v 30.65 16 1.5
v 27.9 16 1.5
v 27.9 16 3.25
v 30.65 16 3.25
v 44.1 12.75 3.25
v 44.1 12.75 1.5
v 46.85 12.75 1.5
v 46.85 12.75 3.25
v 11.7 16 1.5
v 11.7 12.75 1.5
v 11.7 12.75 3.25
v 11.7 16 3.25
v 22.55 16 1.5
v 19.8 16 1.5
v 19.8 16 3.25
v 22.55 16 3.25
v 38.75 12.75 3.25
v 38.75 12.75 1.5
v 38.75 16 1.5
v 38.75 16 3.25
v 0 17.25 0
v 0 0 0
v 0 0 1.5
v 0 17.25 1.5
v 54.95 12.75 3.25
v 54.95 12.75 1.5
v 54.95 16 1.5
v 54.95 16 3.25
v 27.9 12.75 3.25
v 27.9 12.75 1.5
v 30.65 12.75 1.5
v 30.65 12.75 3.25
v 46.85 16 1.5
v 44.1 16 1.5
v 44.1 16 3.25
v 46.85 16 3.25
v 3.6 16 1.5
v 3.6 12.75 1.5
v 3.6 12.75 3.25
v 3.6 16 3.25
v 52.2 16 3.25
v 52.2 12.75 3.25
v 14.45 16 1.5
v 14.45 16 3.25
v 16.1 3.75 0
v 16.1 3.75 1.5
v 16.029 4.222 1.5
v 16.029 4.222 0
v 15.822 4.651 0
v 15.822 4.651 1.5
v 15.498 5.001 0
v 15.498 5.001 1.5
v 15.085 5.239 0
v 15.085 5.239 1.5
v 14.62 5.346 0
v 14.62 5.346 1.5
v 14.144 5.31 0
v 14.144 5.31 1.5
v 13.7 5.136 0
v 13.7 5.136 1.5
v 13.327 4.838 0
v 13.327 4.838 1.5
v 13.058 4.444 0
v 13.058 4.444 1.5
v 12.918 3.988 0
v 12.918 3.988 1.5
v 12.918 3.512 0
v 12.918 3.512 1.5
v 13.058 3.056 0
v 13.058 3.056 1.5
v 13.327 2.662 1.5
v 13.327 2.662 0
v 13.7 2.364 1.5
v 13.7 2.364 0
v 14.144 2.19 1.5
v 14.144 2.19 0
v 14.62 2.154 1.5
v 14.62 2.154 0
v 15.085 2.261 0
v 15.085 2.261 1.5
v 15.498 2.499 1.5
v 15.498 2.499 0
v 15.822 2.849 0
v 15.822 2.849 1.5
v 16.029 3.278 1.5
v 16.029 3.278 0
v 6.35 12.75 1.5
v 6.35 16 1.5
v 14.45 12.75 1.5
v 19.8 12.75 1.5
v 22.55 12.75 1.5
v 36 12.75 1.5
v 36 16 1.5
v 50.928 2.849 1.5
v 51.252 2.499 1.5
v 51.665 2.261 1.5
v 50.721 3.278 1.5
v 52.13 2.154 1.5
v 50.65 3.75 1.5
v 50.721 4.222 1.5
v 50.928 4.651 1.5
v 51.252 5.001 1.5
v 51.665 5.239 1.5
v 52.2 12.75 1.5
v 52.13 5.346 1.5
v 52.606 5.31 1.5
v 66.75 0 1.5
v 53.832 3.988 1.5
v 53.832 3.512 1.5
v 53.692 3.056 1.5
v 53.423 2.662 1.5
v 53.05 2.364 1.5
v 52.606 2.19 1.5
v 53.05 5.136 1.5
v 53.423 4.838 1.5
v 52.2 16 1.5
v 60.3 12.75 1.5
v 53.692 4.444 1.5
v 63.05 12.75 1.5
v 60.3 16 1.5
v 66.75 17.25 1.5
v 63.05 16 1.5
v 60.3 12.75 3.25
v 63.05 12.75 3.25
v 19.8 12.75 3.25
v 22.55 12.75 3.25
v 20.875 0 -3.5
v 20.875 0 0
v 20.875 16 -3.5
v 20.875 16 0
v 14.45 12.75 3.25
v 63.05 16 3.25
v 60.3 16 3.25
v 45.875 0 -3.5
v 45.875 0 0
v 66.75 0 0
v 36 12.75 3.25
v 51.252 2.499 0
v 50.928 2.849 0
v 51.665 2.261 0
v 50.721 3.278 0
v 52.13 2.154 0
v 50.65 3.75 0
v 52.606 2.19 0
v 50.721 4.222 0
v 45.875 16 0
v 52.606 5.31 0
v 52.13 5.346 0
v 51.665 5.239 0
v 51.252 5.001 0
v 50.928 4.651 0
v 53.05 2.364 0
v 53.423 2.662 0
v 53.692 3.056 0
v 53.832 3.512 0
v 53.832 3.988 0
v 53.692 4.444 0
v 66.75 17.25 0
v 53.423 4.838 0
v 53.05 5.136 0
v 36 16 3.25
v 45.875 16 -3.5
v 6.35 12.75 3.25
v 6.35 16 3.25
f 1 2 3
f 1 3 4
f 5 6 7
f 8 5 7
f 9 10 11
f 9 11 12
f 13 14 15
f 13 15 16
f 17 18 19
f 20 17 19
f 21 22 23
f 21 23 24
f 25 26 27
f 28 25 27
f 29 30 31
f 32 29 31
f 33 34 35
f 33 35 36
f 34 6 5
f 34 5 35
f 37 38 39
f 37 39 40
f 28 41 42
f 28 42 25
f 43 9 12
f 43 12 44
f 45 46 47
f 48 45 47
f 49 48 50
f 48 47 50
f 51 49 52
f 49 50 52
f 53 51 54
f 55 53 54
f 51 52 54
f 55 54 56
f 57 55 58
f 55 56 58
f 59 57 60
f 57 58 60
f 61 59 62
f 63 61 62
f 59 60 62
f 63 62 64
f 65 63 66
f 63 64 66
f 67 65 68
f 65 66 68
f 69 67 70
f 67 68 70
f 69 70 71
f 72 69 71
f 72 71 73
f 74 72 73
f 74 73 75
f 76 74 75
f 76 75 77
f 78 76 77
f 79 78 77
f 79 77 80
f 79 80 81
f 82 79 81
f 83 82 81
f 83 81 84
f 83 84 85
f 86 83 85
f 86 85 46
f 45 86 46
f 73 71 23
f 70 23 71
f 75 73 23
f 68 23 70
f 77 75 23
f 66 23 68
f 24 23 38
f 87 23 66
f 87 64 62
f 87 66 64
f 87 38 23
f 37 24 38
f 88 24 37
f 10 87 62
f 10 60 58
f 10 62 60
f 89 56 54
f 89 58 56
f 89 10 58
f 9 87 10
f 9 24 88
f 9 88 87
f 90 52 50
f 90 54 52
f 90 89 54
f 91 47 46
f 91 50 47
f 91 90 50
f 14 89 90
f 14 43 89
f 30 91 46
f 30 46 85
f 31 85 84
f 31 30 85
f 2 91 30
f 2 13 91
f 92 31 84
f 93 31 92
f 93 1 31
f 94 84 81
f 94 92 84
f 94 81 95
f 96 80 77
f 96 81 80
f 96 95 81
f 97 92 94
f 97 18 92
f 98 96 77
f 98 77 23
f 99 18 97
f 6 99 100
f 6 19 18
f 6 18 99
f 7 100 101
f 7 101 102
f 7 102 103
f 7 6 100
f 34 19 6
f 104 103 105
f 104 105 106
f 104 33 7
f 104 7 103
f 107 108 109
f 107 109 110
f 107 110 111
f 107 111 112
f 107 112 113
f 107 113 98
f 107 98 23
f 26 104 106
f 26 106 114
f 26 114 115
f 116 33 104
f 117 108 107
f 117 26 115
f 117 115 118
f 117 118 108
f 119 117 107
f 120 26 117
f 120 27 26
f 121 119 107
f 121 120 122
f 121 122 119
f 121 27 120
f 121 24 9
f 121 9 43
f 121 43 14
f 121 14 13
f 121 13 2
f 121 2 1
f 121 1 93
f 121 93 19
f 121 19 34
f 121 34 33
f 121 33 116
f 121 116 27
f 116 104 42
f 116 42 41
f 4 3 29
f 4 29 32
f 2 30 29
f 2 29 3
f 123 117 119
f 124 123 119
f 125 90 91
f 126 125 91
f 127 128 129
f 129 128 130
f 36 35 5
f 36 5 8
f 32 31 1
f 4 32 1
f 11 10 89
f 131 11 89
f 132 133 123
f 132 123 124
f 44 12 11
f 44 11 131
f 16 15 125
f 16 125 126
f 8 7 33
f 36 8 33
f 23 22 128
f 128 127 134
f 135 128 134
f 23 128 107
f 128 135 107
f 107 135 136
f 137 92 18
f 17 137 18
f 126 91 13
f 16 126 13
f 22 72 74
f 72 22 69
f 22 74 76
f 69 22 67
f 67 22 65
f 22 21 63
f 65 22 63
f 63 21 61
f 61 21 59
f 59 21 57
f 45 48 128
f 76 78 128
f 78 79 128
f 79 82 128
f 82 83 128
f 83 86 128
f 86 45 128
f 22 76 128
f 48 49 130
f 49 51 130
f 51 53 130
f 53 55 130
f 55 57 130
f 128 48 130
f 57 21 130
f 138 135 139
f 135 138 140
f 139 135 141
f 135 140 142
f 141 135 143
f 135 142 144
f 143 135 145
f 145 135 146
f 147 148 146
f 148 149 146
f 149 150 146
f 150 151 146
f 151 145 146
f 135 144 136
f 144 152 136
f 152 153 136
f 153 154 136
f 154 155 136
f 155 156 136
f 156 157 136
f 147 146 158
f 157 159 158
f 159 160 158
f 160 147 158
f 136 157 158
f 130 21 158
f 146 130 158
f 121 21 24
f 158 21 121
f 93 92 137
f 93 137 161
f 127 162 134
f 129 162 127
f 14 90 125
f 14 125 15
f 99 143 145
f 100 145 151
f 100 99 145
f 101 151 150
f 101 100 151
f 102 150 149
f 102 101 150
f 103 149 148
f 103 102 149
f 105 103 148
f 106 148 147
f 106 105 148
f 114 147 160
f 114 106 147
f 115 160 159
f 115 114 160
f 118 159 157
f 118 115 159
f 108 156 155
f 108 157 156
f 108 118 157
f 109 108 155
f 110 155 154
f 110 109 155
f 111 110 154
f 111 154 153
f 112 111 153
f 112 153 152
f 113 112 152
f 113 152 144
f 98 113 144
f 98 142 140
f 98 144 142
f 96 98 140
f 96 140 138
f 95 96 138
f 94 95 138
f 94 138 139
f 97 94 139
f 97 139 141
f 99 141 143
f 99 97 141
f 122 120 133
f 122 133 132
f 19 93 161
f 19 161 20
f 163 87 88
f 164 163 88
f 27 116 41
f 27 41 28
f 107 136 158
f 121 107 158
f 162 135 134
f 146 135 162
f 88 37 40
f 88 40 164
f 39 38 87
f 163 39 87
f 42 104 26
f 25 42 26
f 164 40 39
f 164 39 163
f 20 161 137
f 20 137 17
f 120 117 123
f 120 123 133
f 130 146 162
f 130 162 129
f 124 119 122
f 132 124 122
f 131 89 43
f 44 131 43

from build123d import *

# Parameters (mm, degrees)
SKETCH1_W           = 66.75
SKETCH1_H           = 17.25
BOSS_EXTRUDE1_DEPTH = 1.5
SKETCH2_W           = 2.75
SKETCH2_H           = 3.25
BOSS_EXTRUDE2_DEPTH = 1.75
LPATTERN1_COUNT     = 8
LPATTERN1_PITCH     = 8.1
SKETCH3_R           = 1.6
CUT_EXTRUDE1_DEPTH  = 2.5
SKETCH4_W           = 25
SKETCH4_H           = 16
BOSS_EXTRUDE3_DEPTH = 3.5


with BuildPart() as part:
    # Sketch1 → Boss-Extrude1 (new body)
    with BuildSketch(Plane.XY):
        with Locations((33.375, 8.625)):
            Rectangle(SKETCH1_W, SKETCH1_H)
    extrude(amount=BOSS_EXTRUDE1_DEPTH)

    # Sketch2 → Boss-Extrude2 (add)
    with BuildSketch(Plane.XY.offset(1.5)):
        with Locations((4.975, 14.375)):
            Rectangle(SKETCH2_W, SKETCH2_H)
    boss_extrude2 = extrude(amount=BOSS_EXTRUDE2_DEPTH)

    # LPattern1: Boss-Extrude2 ×8
    with Locations(*[(i * LPATTERN1_PITCH, 0, 0) for i in range(1, LPATTERN1_COUNT)]):
        add(boss_extrude2)

    # Sketch3 → Cut-Extrude1 (cut, through all)
    with BuildSketch(Plane.XY.offset(1.5)):
        with Locations((14.5, 3.75)):
            Circle(SKETCH3_R)
    cut_extrude1 = extrude(amount=-CUT_EXTRUDE1_DEPTH, mode=Mode.SUBTRACT)

    # Mirror1: Cut-Extrude1 across plane
    add(cut_extrude1.mirror(Plane.ZY.offset(-33.375)), mode=Mode.SUBTRACT)

    # Sketch4 → Boss-Extrude3 (add)
    with BuildSketch(Plane(origin=(0, 0, 0), x_dir=(-1, 0, 0), z_dir=(0, 0, -1))):
        with Locations((-33.375, 8)):
            Rectangle(SKETCH4_W, SKETCH4_H)
    extrude(amount=BOSS_EXTRUDE3_DEPTH)


solid = part.part
